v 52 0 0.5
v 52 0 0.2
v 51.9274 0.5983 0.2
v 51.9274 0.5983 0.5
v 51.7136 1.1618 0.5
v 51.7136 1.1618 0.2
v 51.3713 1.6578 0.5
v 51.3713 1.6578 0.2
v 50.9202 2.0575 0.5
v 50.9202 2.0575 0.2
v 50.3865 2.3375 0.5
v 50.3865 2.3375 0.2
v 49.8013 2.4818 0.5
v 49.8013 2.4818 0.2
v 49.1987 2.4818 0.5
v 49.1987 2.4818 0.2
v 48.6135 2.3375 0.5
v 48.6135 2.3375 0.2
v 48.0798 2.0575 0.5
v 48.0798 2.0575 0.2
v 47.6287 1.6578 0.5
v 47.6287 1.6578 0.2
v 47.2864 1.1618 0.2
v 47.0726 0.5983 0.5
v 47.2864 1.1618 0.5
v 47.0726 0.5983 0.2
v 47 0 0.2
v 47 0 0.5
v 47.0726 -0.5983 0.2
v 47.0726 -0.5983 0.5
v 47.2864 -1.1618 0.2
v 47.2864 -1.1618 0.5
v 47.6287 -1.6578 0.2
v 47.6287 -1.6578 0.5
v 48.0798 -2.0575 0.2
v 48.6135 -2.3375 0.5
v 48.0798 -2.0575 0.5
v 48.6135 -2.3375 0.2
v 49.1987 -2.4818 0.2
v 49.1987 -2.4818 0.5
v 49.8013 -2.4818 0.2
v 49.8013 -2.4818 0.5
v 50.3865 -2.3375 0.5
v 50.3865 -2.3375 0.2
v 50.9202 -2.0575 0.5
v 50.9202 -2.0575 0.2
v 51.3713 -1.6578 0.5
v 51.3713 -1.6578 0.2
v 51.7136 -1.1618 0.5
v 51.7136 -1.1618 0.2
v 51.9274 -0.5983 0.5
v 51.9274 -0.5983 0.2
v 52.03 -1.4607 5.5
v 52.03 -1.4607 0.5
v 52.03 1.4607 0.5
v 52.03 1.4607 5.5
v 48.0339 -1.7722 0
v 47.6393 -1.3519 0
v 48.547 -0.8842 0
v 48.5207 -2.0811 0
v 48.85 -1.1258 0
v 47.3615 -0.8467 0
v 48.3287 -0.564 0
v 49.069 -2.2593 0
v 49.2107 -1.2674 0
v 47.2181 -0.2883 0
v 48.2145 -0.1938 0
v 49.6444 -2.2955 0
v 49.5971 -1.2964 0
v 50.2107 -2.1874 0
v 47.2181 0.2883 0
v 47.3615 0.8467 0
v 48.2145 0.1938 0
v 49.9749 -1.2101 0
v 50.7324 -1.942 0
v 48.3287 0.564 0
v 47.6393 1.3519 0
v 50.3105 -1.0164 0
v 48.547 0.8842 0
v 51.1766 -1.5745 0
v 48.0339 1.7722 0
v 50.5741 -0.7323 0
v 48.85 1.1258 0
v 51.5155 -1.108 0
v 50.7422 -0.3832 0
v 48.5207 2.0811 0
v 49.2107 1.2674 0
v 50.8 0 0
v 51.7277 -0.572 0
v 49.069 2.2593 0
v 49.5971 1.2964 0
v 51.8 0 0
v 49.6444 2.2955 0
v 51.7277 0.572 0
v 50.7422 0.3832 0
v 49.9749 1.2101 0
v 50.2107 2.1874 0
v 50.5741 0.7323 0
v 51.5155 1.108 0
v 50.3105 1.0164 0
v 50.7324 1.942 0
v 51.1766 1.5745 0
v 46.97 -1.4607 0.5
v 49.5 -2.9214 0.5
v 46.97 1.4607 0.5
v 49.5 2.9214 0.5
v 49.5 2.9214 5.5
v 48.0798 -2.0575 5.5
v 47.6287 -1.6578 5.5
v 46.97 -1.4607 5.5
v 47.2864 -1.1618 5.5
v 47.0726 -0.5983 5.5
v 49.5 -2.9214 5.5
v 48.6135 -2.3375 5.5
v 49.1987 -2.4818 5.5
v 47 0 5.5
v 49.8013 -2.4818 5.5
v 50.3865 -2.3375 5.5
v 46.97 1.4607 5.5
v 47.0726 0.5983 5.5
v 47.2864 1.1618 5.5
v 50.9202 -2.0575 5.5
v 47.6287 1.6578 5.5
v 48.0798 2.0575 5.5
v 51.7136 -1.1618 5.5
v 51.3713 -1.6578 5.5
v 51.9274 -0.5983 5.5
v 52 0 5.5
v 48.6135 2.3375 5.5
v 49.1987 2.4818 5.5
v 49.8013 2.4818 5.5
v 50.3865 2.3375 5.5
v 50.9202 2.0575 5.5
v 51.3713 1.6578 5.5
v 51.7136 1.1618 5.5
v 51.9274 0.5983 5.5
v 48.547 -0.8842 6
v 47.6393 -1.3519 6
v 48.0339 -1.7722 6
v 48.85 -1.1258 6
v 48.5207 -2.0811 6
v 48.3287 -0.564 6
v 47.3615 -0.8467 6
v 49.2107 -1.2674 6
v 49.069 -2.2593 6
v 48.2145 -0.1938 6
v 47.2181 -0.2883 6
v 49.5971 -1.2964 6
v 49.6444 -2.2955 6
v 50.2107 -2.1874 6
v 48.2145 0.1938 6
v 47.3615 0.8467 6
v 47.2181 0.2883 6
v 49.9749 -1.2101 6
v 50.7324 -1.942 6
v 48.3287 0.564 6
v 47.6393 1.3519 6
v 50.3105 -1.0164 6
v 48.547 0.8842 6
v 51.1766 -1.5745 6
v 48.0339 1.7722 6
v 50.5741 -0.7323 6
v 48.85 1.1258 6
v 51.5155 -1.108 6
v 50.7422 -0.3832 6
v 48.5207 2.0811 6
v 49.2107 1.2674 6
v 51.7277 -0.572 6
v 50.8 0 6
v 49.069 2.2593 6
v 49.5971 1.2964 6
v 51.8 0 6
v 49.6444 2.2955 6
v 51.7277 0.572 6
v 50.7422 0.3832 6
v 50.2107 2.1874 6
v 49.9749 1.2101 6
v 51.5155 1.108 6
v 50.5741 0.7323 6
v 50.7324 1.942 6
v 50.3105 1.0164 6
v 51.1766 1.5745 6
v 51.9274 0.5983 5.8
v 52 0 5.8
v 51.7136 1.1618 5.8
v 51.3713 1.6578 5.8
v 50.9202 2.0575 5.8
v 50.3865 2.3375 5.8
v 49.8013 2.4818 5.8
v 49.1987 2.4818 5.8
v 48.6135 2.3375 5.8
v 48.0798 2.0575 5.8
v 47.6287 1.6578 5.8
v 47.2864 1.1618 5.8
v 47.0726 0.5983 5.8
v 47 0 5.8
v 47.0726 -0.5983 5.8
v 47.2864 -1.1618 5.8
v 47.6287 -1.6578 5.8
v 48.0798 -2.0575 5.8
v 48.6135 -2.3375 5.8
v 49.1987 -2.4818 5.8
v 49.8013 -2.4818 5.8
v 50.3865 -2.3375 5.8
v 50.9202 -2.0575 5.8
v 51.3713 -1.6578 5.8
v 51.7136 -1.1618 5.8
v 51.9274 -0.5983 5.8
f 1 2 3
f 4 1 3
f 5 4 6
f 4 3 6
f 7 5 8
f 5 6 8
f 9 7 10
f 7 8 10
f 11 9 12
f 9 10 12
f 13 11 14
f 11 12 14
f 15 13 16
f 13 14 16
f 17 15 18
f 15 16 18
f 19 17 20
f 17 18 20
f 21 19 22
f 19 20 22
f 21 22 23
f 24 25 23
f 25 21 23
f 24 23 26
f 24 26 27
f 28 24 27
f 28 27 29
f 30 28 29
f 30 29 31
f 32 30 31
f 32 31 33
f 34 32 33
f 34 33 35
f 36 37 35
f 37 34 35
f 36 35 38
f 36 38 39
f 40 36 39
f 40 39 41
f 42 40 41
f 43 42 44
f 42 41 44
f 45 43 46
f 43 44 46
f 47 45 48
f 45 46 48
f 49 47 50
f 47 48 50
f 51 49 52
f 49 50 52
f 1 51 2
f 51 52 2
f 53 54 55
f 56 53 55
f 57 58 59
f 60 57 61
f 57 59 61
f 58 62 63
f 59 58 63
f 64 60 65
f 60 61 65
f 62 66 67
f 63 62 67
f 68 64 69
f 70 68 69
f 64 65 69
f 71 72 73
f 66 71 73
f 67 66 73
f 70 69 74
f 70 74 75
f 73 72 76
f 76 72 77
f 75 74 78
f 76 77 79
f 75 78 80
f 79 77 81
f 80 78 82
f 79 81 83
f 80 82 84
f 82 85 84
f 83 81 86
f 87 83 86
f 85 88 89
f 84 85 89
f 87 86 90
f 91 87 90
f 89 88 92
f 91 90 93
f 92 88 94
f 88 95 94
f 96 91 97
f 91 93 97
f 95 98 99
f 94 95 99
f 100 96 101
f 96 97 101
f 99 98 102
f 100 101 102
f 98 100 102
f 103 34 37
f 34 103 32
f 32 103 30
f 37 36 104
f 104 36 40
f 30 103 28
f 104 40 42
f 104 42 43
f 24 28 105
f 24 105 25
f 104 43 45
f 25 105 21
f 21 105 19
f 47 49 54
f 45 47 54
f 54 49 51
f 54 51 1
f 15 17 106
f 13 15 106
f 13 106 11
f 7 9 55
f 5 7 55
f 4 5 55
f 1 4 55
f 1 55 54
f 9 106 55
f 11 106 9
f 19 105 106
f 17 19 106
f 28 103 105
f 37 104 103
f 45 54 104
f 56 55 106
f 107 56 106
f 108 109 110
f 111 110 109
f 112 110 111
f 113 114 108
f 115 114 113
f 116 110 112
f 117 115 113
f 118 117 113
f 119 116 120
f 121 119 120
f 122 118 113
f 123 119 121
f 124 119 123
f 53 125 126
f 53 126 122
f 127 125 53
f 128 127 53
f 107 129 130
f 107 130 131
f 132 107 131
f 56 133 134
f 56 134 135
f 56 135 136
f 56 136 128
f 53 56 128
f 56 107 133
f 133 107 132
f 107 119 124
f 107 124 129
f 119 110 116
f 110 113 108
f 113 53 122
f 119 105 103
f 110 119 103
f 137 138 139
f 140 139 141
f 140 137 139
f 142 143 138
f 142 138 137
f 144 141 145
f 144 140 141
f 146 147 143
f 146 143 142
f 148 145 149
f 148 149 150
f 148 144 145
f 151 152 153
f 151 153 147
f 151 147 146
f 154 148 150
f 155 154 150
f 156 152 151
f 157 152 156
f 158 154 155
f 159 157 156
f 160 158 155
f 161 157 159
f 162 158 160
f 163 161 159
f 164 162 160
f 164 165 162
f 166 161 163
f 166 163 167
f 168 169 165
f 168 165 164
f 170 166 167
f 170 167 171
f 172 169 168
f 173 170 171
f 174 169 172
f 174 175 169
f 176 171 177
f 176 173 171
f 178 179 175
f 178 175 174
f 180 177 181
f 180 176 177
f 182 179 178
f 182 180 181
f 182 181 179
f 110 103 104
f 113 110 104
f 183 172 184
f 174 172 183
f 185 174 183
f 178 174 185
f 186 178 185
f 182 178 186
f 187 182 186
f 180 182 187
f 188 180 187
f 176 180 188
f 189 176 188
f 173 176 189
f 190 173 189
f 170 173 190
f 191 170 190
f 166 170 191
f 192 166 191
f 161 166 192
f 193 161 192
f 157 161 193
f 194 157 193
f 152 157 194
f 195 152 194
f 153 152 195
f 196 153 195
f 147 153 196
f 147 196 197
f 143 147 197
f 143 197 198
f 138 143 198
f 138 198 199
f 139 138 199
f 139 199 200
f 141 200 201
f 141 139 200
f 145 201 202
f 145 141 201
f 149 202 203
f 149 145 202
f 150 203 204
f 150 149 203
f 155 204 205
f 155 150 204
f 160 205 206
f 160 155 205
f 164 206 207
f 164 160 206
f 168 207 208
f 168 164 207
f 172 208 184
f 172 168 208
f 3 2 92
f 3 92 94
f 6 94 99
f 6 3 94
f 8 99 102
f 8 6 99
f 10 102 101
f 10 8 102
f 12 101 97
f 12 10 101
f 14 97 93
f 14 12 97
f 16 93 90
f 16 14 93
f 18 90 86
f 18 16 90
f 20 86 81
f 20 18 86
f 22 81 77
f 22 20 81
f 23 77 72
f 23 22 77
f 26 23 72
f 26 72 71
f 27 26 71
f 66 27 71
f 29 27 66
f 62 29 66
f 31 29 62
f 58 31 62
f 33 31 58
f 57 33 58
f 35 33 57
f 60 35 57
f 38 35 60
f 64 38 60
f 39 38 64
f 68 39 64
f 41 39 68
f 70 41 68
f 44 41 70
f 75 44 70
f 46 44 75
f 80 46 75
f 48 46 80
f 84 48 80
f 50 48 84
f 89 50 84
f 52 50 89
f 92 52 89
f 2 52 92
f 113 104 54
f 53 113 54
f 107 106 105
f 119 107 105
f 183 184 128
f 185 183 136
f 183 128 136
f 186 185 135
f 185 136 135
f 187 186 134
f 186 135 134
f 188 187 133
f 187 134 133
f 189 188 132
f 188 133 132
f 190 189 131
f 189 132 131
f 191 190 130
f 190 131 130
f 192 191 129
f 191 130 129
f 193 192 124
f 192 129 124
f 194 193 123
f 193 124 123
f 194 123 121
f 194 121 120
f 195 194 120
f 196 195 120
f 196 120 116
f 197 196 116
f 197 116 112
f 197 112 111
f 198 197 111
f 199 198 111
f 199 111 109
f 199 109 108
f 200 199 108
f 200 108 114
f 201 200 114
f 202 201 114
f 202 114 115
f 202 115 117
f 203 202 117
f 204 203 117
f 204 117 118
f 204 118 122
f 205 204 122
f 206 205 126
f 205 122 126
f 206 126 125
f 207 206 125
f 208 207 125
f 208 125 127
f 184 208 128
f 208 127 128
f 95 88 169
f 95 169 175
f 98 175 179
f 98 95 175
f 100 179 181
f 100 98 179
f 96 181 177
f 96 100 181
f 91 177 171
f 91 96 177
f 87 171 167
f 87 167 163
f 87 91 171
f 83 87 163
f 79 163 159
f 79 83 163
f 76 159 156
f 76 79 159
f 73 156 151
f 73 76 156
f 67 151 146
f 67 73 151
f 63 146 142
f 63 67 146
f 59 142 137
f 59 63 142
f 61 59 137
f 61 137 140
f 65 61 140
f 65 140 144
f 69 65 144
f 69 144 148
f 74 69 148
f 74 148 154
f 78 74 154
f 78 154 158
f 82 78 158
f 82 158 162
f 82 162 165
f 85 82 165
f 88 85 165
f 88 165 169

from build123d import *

# Parameters (mm, degrees)
SKETCH003_R     = 2.5
SKETCH003_R_2   = 1.3
PAD003_DEPTH    = 6
SKETCH004_R     = 1.3
PAD004_DEPTH    = 5
CHAMFER001_SIZE = 0.2


with BuildPart() as part:
    # Sketch003 → Pad003 (new body)
    with BuildSketch(Plane.XY):
        Circle(SKETCH003_R)
        Circle(SKETCH003_R_2, mode=Mode.SUBTRACT)
    extrude(amount=PAD003_DEPTH)

    # Sketch004 → Pad004 (join)
    with BuildSketch(Plane.XY.offset(0.5)):
        Polygon((2.53, -1.460696), (2.53, 1.460696), (0, 2.921392), (-2.53, 1.460696), (-2.53, -1.460696), (0, -2.921392), align=None)
        Circle(SKETCH004_R, mode=Mode.SUBTRACT)
    extrude(amount=PAD004_DEPTH)

    # Chamfer001
    chamfer001_edges = [part.edges().sort_by_distance(p)[0] for p in [
        (-2.5, 0, 6),
        (-2.5, 0, 0),
    ]]
    chamfer(chamfer001_edges, length=CHAMFER001_SIZE)


with BuildPart() as part_1:
    # Body002 placement: moved
    add(part.part.moved(Location((49.5, 0, 0))))


solid = part_1.part
